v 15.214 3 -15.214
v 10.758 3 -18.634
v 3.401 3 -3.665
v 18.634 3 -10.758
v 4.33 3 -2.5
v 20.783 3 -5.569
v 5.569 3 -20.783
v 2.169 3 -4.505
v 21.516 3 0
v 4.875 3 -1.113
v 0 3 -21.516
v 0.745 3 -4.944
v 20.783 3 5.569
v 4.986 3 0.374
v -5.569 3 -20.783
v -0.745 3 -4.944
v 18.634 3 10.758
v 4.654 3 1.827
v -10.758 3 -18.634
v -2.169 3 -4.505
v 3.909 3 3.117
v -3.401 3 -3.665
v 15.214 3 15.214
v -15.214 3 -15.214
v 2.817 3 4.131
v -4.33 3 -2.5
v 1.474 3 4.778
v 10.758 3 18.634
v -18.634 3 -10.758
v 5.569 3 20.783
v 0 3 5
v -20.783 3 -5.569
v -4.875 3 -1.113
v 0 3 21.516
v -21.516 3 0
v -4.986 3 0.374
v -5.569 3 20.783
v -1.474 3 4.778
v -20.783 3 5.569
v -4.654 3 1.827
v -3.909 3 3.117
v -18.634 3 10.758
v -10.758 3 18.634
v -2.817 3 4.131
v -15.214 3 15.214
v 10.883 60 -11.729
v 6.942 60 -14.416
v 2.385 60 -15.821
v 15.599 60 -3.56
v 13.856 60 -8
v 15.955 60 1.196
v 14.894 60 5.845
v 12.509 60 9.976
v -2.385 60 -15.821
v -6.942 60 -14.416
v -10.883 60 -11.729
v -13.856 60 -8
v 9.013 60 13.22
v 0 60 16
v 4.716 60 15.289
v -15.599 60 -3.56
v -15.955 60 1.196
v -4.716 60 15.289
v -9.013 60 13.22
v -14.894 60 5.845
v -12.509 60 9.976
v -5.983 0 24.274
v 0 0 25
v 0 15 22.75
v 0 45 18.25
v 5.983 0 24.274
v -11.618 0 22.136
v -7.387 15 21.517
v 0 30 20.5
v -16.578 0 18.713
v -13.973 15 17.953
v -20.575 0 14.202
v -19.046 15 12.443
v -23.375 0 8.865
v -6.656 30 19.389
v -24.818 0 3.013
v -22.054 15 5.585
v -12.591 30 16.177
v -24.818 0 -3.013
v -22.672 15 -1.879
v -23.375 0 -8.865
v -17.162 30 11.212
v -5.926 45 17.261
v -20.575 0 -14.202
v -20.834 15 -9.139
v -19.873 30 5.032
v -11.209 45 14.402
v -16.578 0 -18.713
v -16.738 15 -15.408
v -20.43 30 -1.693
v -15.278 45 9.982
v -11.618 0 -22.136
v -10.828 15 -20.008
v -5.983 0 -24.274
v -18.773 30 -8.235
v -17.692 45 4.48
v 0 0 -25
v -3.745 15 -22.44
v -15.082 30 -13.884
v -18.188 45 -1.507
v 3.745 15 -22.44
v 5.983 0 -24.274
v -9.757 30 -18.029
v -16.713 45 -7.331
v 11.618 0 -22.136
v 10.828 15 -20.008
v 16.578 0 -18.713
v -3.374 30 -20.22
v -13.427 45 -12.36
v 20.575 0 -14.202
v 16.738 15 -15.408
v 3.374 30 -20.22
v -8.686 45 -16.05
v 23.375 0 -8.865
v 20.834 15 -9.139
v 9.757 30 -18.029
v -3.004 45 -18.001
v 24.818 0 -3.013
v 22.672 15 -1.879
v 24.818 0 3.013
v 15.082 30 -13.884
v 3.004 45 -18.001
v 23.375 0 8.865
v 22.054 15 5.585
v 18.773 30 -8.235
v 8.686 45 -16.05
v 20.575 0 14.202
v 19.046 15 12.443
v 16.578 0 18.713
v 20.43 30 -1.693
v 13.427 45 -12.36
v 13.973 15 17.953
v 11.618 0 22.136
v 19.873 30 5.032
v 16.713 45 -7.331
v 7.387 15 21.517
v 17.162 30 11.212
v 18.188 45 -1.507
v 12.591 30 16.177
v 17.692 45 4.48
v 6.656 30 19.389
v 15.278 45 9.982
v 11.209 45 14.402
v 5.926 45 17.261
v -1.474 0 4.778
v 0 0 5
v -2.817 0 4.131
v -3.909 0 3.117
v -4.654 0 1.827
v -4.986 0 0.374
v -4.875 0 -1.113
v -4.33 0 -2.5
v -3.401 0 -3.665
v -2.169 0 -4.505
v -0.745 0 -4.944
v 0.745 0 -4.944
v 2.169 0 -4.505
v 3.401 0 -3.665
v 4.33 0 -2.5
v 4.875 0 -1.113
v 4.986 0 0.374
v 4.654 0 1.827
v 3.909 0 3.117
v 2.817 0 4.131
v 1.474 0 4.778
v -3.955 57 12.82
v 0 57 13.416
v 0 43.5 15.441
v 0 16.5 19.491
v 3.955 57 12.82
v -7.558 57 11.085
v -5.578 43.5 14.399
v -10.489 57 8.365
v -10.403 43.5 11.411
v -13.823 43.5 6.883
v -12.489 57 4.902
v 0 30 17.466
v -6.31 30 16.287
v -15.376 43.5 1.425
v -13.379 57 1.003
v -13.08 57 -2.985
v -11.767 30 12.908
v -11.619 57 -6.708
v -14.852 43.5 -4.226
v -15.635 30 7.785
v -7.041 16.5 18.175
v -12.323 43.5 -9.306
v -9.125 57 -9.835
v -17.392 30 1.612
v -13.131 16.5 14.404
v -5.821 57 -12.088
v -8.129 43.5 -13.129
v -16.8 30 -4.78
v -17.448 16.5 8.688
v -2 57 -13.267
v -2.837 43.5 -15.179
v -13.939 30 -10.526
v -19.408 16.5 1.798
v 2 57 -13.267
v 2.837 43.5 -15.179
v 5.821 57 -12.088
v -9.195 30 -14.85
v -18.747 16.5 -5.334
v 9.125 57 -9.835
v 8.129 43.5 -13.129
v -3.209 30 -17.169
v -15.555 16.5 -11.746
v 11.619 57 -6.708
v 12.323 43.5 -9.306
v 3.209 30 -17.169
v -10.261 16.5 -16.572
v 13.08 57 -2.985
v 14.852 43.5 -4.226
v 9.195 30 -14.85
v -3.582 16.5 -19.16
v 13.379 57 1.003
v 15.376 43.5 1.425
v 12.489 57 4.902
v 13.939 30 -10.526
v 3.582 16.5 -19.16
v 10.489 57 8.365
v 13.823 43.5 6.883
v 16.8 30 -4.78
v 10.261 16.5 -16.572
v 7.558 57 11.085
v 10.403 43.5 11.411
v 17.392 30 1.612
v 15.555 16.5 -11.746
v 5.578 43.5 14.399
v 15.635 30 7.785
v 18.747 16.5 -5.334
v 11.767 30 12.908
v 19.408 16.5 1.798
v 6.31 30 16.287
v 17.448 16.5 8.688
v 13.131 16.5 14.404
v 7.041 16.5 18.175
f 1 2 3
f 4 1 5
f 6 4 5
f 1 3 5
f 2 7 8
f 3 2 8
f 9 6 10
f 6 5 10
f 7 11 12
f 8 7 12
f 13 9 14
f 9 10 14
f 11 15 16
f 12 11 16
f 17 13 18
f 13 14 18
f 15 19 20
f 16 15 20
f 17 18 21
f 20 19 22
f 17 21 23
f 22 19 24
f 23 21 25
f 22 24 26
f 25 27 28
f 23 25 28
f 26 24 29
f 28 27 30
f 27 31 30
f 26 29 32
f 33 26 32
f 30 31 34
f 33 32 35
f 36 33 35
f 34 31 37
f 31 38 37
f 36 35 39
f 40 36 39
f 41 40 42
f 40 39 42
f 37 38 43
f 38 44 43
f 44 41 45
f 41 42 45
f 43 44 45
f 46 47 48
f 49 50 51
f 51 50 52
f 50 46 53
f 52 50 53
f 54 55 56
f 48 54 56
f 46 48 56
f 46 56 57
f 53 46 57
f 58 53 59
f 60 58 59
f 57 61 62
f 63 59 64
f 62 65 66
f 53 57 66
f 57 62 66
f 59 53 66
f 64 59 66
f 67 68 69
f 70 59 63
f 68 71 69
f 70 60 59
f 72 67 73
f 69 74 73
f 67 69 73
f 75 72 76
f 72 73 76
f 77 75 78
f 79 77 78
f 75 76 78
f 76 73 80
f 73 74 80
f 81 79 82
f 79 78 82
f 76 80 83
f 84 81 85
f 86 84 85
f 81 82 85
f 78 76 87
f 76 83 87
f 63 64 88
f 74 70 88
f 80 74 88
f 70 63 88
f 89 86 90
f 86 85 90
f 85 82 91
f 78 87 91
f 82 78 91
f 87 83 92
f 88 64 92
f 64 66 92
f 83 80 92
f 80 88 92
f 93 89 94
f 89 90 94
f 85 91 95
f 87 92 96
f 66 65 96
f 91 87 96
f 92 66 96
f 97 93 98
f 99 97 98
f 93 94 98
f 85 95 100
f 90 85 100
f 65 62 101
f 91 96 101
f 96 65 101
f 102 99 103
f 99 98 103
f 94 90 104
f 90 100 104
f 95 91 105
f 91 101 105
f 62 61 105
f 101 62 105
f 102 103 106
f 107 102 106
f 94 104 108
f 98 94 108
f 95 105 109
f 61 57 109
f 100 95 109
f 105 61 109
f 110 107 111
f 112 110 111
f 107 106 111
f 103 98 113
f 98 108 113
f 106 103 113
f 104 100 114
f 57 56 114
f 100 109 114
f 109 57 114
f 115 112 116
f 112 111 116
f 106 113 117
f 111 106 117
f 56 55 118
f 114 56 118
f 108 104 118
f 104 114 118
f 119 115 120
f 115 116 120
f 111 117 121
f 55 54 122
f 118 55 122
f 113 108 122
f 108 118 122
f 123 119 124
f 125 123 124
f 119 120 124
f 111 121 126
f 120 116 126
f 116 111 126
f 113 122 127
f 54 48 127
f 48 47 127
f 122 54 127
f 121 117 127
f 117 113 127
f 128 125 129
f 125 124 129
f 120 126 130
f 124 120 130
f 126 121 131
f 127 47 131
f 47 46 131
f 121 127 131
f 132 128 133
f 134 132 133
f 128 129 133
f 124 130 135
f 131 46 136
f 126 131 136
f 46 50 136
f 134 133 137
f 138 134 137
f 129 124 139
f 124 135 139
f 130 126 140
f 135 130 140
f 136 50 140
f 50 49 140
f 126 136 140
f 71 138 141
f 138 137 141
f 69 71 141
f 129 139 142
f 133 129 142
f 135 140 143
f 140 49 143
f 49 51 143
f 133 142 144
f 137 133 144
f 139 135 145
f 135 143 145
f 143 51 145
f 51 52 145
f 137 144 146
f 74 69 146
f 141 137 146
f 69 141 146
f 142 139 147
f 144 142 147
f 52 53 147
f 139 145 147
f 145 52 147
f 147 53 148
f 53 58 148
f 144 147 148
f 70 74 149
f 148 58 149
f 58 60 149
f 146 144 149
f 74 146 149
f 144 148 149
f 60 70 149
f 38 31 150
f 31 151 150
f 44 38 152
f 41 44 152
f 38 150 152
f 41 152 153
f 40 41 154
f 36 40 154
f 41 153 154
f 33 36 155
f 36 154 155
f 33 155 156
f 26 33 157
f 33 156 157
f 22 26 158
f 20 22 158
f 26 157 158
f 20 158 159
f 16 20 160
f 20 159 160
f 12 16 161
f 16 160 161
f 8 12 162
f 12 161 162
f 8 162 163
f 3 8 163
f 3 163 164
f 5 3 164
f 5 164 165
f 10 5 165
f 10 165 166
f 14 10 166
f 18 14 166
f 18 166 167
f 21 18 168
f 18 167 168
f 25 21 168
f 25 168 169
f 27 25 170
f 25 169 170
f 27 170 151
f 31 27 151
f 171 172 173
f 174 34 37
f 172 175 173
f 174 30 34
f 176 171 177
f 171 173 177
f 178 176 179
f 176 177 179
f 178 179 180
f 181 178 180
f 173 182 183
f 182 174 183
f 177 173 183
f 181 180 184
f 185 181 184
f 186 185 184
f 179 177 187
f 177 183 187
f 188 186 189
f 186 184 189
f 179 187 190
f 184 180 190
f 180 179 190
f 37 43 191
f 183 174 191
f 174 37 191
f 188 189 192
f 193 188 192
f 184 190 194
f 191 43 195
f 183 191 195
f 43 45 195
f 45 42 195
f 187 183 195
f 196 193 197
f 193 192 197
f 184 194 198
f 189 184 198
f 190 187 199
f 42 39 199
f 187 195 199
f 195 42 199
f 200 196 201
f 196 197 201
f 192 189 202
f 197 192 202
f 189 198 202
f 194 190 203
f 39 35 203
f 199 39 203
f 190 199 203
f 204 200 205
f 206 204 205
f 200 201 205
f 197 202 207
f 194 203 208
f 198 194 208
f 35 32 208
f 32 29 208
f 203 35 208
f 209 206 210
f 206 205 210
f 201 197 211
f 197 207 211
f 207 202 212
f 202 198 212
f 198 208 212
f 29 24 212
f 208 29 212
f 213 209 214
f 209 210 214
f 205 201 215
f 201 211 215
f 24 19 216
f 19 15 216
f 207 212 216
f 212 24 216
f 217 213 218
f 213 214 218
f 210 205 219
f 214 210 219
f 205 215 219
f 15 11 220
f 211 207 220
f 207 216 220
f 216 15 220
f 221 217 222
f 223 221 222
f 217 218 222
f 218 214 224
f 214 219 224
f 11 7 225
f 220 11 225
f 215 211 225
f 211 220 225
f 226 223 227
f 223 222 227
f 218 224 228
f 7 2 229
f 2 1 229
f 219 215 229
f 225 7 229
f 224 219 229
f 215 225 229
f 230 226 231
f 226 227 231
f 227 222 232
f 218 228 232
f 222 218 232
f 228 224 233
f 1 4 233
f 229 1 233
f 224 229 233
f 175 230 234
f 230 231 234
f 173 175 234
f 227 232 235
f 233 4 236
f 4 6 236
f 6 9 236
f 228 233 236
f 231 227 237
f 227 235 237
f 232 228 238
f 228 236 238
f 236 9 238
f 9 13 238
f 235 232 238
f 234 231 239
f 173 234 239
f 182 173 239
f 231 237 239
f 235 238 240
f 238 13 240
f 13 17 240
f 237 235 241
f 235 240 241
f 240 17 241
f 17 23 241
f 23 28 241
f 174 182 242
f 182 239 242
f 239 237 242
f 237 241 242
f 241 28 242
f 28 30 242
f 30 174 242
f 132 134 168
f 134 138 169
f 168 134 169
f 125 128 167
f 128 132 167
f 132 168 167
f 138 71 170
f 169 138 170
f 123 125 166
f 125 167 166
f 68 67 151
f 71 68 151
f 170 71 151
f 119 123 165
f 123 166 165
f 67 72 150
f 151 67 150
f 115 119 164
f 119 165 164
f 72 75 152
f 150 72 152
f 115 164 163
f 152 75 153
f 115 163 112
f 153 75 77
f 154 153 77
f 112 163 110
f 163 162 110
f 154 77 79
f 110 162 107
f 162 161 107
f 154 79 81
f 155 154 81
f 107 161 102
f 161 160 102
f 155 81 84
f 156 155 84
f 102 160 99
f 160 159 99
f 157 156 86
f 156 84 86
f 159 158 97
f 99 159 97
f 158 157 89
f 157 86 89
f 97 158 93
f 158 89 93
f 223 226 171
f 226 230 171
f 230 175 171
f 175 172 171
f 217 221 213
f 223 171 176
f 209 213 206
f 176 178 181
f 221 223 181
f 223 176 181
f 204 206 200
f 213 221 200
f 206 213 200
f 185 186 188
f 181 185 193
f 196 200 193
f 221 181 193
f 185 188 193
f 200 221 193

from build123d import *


with BuildPart() as part:
    # 草图2 → 旋转2 (revolve)
    with BuildSketch(Plane(origin=(0, 0, 0), x_dir=(0, 0, -1), z_dir=(1, 0, 0)), mode=Mode.PRIVATE) as revolve_2_sk:
        Polygon((0, 60), (0, 57), (3, 57), (13.416437738, 57), (21.516437738, 3), (21.966437738, 0), (25, 0), (16, 60), align=None)
        Polygon((5, 3), (5, 0), (21.966437738, 0), (21.516437738, 3), align=None)
    revolve(revolve_2_sk.sketch.rotate(Axis((0, 60, 0), (0, -1, 0)), 180), axis=Axis((0, 60, 0), (0, -1, 0)))


solid = part.part
